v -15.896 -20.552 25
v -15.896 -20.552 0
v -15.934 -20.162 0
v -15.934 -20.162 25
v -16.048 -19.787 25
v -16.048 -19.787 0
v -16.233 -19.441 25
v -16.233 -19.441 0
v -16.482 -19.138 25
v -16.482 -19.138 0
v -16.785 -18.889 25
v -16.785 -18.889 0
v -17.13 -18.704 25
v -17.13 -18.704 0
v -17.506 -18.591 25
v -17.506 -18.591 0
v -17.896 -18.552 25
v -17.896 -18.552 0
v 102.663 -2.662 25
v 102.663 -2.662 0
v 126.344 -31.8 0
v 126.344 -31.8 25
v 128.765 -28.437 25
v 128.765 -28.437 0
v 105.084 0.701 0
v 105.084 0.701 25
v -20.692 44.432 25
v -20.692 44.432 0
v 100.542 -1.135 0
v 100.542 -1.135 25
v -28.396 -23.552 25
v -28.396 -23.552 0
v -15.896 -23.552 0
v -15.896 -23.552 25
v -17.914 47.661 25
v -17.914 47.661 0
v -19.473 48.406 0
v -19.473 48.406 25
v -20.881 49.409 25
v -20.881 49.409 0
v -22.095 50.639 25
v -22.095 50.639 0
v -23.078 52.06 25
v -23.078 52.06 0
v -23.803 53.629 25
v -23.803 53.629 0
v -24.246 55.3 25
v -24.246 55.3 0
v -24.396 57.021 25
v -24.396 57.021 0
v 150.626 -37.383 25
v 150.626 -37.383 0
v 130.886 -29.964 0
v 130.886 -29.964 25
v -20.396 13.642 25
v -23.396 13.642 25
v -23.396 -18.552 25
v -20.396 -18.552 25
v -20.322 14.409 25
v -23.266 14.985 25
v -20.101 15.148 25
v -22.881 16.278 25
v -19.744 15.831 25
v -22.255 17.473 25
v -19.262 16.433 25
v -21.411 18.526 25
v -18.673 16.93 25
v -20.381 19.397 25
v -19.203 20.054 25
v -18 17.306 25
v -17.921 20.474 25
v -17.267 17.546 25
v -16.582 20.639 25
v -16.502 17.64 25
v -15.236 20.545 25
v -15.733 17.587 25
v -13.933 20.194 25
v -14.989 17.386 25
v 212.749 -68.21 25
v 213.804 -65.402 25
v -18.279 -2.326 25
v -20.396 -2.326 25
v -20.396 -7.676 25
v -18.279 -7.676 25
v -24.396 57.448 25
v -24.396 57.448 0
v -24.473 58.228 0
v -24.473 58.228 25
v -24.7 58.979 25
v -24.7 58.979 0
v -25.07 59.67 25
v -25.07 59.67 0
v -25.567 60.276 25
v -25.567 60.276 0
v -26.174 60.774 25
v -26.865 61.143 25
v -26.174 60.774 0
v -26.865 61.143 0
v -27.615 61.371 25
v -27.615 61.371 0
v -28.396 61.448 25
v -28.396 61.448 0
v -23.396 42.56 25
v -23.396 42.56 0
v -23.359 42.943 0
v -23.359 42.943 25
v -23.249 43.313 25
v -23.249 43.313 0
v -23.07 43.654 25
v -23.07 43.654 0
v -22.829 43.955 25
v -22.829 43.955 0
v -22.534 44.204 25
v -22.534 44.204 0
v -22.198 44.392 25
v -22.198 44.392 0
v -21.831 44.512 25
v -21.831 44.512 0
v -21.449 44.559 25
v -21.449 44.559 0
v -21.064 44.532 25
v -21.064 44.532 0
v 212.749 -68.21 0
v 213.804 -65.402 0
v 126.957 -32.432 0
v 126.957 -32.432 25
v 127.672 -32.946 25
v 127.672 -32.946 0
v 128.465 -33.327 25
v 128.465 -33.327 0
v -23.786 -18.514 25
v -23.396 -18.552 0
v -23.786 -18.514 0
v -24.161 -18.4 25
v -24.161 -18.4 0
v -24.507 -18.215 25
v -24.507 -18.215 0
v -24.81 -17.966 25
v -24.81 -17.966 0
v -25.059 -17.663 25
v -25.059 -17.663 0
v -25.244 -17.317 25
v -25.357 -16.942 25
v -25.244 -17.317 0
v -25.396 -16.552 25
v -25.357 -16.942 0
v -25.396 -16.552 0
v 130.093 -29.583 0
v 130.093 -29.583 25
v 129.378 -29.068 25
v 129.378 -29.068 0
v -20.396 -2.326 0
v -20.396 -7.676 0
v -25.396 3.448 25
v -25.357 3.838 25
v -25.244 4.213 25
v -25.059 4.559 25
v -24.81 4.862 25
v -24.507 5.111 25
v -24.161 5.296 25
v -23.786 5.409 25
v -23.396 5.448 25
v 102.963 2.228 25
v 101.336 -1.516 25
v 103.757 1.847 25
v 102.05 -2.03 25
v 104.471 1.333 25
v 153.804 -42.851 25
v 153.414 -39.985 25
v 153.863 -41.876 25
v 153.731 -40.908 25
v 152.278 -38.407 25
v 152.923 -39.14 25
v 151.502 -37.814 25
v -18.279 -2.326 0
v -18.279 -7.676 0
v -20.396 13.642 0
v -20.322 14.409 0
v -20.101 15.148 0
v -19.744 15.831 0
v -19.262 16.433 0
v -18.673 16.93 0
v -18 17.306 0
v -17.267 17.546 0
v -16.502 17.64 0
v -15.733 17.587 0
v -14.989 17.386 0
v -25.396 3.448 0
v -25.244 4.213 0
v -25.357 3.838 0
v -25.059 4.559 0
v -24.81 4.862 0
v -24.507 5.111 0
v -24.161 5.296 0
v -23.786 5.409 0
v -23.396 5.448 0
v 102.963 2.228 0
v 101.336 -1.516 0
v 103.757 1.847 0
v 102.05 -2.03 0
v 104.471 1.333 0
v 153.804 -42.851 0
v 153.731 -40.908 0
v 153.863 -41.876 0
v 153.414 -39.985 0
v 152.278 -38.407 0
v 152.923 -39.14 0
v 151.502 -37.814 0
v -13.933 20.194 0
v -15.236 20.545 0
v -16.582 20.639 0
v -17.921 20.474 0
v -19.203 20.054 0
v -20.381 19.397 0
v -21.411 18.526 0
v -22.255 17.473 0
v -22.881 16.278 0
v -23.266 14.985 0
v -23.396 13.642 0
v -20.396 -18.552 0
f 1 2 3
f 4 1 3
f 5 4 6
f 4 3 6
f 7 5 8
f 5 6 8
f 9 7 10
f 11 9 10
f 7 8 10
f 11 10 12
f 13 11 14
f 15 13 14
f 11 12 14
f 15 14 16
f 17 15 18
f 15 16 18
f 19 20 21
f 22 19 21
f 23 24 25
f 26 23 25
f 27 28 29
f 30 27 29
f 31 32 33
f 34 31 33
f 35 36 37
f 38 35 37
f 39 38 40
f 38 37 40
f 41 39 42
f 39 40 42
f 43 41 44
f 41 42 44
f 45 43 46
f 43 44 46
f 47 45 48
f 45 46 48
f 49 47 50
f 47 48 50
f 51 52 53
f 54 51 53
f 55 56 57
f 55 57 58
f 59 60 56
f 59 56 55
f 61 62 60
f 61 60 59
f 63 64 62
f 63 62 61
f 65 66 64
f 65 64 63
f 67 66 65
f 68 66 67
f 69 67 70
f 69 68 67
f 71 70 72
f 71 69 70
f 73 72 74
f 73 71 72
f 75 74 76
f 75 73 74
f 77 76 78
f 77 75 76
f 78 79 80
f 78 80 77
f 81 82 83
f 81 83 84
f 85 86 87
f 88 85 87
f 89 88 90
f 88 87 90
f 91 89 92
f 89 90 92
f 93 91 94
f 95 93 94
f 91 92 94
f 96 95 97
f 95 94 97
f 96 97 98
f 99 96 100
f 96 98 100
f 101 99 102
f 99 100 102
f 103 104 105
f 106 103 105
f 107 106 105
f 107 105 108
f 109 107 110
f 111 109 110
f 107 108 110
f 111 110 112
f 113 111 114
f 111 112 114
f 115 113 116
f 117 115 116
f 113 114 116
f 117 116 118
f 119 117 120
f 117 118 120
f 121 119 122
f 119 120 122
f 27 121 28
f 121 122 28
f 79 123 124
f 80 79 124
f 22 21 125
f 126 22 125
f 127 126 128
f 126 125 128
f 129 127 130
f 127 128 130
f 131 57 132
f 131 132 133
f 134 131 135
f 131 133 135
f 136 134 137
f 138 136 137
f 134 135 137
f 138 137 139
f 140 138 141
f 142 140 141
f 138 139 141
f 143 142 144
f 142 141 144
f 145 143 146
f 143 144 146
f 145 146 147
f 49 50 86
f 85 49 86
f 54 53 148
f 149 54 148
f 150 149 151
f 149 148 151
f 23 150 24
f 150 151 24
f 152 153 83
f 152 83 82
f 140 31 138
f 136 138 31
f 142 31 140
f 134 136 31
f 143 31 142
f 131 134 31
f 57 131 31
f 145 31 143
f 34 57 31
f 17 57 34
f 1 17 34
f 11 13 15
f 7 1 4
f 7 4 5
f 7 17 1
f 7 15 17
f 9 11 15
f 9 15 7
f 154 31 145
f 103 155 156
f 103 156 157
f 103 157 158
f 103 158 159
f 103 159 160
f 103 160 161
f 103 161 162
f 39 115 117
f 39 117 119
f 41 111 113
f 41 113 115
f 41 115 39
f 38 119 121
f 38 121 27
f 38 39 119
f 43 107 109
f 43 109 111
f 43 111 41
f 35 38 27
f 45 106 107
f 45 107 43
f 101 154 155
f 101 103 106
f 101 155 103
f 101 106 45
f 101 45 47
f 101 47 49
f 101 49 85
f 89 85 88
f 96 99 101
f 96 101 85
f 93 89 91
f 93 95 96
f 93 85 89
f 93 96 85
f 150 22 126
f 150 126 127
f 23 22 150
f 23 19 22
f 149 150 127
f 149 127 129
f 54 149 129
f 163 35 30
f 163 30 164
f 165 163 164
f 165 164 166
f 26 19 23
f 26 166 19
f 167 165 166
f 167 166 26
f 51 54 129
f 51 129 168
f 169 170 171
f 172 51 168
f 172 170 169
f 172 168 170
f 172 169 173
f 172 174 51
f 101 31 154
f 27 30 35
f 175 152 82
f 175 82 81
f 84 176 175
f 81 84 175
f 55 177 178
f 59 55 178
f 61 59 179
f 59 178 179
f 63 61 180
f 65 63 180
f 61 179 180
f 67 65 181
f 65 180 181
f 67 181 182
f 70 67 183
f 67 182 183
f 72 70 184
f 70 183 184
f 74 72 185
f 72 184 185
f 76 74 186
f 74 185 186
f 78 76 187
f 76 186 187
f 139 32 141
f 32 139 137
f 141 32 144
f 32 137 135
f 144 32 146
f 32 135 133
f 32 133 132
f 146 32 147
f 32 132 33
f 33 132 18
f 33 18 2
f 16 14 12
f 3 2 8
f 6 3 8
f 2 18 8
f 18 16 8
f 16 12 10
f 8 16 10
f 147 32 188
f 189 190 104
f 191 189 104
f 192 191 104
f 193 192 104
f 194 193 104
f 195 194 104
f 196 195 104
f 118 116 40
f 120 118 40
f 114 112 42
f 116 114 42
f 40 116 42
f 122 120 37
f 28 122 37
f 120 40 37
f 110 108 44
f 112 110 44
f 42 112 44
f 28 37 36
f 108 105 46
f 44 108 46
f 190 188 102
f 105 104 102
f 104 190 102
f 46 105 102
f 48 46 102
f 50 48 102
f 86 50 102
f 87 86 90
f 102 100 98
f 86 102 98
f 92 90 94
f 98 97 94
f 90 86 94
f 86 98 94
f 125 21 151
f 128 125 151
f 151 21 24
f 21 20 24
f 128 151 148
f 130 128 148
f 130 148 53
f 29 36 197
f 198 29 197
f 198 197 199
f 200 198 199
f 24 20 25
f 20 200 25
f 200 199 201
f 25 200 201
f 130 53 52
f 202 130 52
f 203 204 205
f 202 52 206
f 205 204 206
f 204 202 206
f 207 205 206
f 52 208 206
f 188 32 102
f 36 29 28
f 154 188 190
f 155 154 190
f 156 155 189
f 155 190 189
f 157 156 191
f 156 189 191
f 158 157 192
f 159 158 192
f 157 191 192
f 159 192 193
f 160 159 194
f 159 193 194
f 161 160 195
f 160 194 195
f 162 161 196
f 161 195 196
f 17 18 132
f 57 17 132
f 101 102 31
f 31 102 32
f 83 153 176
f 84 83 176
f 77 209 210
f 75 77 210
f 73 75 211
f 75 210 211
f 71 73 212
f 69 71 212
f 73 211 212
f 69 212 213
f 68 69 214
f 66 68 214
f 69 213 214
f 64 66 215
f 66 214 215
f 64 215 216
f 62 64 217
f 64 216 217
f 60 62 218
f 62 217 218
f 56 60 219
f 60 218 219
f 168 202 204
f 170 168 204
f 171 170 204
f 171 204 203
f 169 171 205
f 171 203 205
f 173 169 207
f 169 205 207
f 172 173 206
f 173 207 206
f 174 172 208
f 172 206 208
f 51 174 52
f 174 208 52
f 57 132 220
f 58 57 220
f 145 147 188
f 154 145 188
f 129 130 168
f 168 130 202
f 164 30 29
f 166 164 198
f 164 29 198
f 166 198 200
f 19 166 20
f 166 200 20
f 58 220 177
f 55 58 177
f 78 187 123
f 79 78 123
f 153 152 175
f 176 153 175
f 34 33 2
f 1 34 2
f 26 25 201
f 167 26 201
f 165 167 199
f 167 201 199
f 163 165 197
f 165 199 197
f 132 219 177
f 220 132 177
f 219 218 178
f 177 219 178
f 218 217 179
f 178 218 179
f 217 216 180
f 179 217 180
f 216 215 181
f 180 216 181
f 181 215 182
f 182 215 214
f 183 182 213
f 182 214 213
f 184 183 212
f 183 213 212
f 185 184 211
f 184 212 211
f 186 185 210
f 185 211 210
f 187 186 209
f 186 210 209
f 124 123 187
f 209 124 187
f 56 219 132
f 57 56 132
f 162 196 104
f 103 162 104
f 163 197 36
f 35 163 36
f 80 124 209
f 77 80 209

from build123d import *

# Parameters (mm, degrees)
F3_DEPTH = 25
F4_DEPTH = 25
F2_W     = 2.117321
F2_H     = 5.349764
F5_DEPTH = 25


with BuildPart() as f3:
    # F0 (on Top) → F3 (new body)
    with BuildSketch(Plane.XY):
        with BuildLine():
            Line((-28.395831, 61.447918), (-28.395831, -23.552082))
            Line((-28.395831, -23.552082), (-15.895831, -23.552082))
            Line((-15.895831, -23.552082), (-15.895831, -20.552082))
            ThreePointArc((-15.895831, -20.552082), (-16.481618, -19.137868), (-17.895831, -18.552082))
            Line((-17.895831, -18.552082), (-23.395831, -18.552082))
            ThreePointArc((-23.395831, -18.552082), (-24.810045, -17.966296), (-25.395831, -16.552082))
            Line((-25.395831, -16.552082), (-25.395831, 3.447918))
            ThreePointArc((-25.395831, 3.447918), (-24.810045, 4.862132), (-23.395831, 5.447918))
            Line((-23.395831, 5.447918), (-23.395831, 42.559603))
            ThreePointArc((-23.395831, 42.559603), (-22.534404, 44.203881), (-20.692179, 44.431733))
            Line((-20.692179, 44.431733), (100.542209, -1.134979))
            ThreePointArc((100.542209, -1.134979), (101.70426, -1.757387), (102.663259, -2.661862))
            Line((102.663259, -2.661862), (126.343989, -31.800006))
            ThreePointArc((126.343989, -31.800006), (127.302988, -32.704481), (128.465038, -33.326889))
            Line((128.465038, -33.326889), (153.804169, -42.850762))
            ThreePointArc((153.804169, -42.850762), (153.189293, -39.550444), (150.625708, -37.382911))
            Line((150.625708, -37.382911), (130.886128, -29.963665))
            ThreePointArc((130.886128, -29.963665), (129.724078, -29.341257), (128.765079, -28.436782))
            Line((128.765079, -28.436782), (105.084348, 0.701362))
            ThreePointArc((105.084348, 0.701362), (104.12535, 1.605836), (102.963299, 2.228245))
            Line((102.963299, 2.228245), (-17.914092, 47.660778))
            ThreePointArc((-17.914092, 47.660778), (-22.617224, 51.328568), (-24.395831, 57.021431))
            Line((-24.395831, 57.021431), (-24.395831, 57.447918))
            ThreePointArc((-24.395831, 57.447918), (-25.567404, 60.276345), (-28.395831, 61.447918))
        make_face()
    extrude(amount=F3_DEPTH)


with BuildPart() as f4:
    # F1 (on Top) → F4 (new body)
    with BuildSketch(Plane.XY):
        with BuildLine():
            Line((-23.395831, 13.641875), (-23.395831, -18.552082))
            Line((-23.395831, -18.552082), (-20.395831, -18.552082))
            Line((-20.395831, -18.552082), (-20.395831, 13.641875))
            ThreePointArc((-20.395831, 13.641875), (-18.672977, 16.930433), (-14.988527, 17.386137))
            Line((-14.988527, 17.386137), (212.748691, -68.210337))
            Line((212.748691, -68.210337), (213.804169, -65.402141))
            Line((213.804169, -65.402141), (-13.933049, 20.194333))
            ThreePointArc((-13.933049, 20.194333), (-20.380836, 19.396851), (-23.395831, 13.641875))
        make_face()
    extrude(amount=F4_DEPTH)


with BuildPart() as f5:
    # F2 (on Top) → F5 (new body)
    with BuildSketch(Plane.XY):
        with Locations((-19.33717, -5.00126)):
            Rectangle(F2_W, F2_H)
    extrude(amount=F5_DEPTH)


solid = Compound([f3.part, f4.part, f5.part])
